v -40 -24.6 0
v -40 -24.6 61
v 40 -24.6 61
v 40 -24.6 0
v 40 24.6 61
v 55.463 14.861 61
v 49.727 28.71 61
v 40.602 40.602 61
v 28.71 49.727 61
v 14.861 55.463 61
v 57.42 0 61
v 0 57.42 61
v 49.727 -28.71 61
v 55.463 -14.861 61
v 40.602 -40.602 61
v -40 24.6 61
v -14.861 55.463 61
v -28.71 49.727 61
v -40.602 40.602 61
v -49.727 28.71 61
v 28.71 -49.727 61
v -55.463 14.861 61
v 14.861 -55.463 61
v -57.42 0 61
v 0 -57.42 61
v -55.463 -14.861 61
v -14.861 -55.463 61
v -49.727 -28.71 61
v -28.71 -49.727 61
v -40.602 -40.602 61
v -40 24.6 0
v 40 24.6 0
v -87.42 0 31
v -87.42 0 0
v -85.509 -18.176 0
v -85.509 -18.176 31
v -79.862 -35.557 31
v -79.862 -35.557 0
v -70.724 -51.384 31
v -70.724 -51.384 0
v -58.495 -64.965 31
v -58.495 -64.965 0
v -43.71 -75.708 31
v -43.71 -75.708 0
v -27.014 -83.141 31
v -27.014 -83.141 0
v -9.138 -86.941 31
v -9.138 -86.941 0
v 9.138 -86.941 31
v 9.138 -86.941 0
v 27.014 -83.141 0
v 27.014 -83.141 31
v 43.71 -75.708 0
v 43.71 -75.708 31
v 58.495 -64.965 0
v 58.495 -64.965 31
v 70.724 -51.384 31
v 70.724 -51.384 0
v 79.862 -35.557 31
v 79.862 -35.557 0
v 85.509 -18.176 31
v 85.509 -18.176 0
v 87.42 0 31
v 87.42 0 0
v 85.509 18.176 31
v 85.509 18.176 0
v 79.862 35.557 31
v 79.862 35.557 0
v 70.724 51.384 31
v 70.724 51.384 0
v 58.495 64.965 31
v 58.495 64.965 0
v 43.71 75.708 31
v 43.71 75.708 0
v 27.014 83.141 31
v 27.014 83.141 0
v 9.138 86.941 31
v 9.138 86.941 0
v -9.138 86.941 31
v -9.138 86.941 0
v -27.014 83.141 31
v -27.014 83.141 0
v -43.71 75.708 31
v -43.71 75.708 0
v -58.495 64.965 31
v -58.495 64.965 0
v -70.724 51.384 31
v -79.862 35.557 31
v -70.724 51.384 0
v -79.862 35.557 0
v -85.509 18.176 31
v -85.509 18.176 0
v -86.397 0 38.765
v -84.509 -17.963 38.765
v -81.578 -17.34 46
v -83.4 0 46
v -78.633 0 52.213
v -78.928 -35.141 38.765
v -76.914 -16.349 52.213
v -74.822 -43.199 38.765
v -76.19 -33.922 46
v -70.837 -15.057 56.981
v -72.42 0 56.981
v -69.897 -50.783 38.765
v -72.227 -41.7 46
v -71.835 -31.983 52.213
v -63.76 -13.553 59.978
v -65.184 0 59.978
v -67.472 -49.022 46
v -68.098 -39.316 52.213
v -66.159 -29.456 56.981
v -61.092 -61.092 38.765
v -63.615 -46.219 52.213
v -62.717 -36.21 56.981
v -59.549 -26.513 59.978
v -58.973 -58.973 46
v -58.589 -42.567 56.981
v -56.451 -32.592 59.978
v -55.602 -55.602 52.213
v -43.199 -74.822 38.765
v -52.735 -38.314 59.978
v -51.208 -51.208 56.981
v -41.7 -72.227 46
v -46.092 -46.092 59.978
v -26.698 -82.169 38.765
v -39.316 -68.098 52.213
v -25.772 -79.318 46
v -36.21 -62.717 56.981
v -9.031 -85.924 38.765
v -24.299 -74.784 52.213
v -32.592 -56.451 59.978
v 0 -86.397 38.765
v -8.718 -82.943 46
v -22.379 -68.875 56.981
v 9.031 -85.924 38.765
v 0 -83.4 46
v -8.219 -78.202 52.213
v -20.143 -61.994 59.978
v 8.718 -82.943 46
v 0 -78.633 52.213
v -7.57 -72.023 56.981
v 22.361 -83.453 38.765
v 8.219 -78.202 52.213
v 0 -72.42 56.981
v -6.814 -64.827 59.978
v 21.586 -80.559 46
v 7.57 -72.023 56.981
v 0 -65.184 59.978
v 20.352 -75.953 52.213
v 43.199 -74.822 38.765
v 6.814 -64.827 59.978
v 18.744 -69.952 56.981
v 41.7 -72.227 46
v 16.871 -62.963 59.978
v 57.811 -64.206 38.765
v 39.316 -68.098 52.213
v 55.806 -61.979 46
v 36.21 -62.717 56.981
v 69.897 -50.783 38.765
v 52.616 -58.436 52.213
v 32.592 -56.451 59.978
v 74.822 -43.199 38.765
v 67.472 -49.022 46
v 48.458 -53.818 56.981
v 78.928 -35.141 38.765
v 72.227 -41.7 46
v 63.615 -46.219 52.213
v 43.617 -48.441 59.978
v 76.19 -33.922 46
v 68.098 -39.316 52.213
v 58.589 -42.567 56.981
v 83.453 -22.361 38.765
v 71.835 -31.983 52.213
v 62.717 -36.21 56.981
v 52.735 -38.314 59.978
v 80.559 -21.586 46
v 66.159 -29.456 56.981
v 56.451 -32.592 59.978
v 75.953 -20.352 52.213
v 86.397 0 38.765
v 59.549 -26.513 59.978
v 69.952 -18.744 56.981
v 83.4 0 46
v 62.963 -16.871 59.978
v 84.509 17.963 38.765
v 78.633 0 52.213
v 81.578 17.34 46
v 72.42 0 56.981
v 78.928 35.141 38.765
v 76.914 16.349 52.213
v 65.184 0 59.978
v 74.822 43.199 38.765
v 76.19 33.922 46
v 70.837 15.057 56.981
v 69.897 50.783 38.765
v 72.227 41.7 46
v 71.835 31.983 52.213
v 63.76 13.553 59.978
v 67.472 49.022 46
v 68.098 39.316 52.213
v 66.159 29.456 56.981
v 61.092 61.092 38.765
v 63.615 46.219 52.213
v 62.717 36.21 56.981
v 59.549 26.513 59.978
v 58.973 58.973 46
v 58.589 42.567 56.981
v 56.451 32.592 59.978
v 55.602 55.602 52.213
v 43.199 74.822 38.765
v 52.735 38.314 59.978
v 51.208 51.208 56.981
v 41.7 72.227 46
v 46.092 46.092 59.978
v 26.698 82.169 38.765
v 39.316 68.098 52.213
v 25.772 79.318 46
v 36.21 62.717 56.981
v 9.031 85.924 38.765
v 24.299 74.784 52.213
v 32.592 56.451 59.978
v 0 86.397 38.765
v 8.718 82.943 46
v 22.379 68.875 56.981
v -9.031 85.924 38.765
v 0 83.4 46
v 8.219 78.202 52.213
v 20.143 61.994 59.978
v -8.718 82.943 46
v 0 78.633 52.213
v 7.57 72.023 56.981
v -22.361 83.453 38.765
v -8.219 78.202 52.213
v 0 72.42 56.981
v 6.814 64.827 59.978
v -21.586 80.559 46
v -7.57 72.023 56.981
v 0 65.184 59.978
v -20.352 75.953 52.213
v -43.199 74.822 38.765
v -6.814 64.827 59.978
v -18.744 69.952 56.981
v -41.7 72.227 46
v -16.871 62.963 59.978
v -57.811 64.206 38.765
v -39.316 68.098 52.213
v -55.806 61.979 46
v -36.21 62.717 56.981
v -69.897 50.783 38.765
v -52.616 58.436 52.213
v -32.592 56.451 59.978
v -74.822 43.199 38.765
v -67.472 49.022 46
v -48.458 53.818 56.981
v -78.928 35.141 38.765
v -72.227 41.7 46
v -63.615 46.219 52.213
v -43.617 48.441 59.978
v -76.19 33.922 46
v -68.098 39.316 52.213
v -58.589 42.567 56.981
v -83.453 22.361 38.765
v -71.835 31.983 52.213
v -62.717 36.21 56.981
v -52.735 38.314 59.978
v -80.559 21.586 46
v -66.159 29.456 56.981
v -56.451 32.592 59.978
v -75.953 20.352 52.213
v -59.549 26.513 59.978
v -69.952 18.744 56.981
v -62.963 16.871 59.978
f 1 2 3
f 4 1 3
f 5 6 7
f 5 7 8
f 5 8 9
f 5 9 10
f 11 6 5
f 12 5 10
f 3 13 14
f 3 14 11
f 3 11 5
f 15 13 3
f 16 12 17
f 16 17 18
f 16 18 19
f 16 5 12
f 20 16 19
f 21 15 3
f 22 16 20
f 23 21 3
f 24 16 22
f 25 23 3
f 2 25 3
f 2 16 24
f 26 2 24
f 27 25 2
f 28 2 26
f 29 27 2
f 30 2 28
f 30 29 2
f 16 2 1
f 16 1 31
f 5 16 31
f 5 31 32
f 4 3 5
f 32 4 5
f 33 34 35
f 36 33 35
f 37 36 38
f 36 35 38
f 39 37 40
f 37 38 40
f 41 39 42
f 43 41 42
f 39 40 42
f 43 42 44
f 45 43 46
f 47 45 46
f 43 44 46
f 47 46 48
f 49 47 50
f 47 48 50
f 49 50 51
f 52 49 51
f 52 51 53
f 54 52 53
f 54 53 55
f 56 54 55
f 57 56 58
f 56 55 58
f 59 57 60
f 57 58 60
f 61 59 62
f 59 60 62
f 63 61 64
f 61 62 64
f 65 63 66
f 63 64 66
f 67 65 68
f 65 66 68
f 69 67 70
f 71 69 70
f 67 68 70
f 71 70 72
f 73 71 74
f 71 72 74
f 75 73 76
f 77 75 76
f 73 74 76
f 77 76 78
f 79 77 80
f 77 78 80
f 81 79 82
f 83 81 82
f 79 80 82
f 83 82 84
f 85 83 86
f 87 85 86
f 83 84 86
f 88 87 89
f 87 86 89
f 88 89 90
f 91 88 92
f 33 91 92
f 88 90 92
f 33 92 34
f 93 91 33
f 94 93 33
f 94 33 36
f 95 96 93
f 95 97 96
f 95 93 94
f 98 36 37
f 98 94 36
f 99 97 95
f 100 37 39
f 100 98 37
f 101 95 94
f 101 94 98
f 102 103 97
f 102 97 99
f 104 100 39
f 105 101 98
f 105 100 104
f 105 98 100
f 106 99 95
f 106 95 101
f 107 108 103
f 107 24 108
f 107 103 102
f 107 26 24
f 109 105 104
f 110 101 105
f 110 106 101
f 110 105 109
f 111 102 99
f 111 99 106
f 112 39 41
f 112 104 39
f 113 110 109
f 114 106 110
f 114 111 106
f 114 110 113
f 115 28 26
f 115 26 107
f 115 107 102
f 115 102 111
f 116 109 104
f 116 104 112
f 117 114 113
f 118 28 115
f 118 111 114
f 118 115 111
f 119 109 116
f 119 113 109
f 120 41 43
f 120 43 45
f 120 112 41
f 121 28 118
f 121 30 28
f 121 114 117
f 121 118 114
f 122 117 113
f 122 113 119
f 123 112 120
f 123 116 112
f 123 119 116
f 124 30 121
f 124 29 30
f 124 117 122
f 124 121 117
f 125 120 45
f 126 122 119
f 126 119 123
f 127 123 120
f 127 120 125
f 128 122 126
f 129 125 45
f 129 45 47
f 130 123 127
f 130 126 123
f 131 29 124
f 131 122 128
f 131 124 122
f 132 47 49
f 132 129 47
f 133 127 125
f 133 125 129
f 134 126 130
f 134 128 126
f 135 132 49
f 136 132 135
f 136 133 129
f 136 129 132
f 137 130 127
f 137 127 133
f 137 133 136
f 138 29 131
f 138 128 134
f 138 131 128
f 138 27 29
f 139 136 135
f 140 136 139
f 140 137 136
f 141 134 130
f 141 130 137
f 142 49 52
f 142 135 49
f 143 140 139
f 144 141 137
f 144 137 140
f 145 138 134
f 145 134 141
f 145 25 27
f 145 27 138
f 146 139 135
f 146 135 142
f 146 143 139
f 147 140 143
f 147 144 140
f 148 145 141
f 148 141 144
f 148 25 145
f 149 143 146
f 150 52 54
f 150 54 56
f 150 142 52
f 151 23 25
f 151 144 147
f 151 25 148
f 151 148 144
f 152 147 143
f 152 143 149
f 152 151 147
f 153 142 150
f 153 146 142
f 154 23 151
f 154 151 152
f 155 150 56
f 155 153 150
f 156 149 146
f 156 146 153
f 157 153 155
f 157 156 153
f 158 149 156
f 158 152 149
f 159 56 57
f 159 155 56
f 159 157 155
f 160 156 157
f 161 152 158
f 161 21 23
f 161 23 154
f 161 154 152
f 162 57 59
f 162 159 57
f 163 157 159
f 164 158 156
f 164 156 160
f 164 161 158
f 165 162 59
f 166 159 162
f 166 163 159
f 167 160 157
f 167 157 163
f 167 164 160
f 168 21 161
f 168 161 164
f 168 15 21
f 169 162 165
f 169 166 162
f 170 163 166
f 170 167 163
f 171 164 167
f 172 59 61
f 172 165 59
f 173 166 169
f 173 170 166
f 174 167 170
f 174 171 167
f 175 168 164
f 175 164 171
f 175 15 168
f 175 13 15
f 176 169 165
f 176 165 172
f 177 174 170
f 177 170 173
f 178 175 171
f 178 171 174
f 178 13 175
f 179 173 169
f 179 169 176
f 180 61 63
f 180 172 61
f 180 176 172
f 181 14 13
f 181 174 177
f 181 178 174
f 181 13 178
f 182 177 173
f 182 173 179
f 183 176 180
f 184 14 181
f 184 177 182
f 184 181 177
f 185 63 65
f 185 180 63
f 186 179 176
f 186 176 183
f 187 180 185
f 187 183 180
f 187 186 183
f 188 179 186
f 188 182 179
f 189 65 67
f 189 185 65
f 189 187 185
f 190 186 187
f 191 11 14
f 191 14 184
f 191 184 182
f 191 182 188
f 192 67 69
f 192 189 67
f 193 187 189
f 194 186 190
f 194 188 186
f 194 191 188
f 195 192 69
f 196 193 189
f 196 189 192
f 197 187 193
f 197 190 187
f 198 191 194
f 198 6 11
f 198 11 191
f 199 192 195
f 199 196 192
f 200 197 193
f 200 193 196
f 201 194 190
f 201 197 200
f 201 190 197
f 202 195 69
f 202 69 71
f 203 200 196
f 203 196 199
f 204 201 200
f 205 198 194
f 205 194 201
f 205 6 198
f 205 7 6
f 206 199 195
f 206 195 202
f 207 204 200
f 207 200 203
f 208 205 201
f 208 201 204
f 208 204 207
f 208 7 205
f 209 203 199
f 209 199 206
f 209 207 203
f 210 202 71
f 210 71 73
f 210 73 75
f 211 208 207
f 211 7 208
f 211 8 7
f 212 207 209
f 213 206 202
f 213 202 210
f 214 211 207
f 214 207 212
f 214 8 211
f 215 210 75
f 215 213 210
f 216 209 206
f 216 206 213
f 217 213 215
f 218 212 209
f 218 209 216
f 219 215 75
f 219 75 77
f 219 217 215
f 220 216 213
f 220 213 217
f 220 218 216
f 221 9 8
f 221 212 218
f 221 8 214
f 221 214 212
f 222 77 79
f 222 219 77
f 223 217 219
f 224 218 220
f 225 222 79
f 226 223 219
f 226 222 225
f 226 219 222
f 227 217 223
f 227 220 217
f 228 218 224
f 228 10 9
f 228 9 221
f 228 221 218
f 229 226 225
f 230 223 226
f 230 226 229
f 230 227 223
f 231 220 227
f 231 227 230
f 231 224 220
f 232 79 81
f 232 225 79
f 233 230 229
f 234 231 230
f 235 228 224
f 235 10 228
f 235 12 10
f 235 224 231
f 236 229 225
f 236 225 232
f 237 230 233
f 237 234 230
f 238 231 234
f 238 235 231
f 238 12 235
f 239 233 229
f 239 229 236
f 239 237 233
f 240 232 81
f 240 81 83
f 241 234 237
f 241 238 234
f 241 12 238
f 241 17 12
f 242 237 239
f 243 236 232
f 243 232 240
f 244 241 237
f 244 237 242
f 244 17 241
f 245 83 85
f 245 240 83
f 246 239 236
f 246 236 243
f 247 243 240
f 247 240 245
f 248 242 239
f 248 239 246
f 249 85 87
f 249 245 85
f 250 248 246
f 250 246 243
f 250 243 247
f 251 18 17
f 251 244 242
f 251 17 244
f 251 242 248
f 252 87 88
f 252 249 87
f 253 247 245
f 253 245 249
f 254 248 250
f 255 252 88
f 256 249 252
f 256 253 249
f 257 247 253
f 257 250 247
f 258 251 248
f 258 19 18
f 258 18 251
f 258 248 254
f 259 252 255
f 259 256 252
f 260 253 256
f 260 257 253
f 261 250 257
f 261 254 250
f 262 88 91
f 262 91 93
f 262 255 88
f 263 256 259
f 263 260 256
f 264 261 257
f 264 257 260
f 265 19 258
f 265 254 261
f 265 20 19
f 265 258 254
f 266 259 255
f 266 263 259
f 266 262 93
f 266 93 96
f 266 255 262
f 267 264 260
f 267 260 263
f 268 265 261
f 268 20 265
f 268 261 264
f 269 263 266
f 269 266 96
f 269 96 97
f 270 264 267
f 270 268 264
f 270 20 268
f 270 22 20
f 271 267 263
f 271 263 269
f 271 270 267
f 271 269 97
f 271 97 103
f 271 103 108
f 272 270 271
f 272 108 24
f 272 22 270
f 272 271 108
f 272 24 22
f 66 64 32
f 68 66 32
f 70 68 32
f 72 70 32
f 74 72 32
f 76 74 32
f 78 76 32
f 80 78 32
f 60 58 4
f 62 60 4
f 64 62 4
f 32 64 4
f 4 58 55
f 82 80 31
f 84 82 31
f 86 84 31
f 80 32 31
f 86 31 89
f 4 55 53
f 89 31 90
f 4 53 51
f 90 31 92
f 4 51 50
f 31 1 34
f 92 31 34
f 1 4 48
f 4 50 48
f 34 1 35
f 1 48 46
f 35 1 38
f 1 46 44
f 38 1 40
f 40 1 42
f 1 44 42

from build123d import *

# Parameters (mm, degrees)
SKETCH1_R           = 87.419609077
BOSS_EXTRUDE1_DEPTH = 61
FILLET1_R           = 30
SKETCH2_W           = 80
SKETCH2_H           = 49.2
CUT_EXTRUDE1_DEPTH  = 61


with BuildPart() as part:
    # Sketch1 → Boss-Extrude1 (new body)
    with BuildSketch(Plane.XY):
        with Locations(Location((0, 0, 0), (0, 0, 180))):
            Circle(SKETCH1_R)
    extrude(amount=BOSS_EXTRUDE1_DEPTH)

    # Fillet1
    fillet1_edges = [part.edges().sort_by_distance(p)[0] for p in [
        (87.419609077, 0, 61),
    ]]
    fillet(fillet1_edges, radius=FILLET1_R)

    # Sketch2 → Cut-Extrude1 (cut)
    with BuildSketch(Plane.XY.offset(61)):
        Rectangle(SKETCH2_W, SKETCH2_H)
    extrude(amount=-CUT_EXTRUDE1_DEPTH, mode=Mode.SUBTRACT)


solid = part.part
